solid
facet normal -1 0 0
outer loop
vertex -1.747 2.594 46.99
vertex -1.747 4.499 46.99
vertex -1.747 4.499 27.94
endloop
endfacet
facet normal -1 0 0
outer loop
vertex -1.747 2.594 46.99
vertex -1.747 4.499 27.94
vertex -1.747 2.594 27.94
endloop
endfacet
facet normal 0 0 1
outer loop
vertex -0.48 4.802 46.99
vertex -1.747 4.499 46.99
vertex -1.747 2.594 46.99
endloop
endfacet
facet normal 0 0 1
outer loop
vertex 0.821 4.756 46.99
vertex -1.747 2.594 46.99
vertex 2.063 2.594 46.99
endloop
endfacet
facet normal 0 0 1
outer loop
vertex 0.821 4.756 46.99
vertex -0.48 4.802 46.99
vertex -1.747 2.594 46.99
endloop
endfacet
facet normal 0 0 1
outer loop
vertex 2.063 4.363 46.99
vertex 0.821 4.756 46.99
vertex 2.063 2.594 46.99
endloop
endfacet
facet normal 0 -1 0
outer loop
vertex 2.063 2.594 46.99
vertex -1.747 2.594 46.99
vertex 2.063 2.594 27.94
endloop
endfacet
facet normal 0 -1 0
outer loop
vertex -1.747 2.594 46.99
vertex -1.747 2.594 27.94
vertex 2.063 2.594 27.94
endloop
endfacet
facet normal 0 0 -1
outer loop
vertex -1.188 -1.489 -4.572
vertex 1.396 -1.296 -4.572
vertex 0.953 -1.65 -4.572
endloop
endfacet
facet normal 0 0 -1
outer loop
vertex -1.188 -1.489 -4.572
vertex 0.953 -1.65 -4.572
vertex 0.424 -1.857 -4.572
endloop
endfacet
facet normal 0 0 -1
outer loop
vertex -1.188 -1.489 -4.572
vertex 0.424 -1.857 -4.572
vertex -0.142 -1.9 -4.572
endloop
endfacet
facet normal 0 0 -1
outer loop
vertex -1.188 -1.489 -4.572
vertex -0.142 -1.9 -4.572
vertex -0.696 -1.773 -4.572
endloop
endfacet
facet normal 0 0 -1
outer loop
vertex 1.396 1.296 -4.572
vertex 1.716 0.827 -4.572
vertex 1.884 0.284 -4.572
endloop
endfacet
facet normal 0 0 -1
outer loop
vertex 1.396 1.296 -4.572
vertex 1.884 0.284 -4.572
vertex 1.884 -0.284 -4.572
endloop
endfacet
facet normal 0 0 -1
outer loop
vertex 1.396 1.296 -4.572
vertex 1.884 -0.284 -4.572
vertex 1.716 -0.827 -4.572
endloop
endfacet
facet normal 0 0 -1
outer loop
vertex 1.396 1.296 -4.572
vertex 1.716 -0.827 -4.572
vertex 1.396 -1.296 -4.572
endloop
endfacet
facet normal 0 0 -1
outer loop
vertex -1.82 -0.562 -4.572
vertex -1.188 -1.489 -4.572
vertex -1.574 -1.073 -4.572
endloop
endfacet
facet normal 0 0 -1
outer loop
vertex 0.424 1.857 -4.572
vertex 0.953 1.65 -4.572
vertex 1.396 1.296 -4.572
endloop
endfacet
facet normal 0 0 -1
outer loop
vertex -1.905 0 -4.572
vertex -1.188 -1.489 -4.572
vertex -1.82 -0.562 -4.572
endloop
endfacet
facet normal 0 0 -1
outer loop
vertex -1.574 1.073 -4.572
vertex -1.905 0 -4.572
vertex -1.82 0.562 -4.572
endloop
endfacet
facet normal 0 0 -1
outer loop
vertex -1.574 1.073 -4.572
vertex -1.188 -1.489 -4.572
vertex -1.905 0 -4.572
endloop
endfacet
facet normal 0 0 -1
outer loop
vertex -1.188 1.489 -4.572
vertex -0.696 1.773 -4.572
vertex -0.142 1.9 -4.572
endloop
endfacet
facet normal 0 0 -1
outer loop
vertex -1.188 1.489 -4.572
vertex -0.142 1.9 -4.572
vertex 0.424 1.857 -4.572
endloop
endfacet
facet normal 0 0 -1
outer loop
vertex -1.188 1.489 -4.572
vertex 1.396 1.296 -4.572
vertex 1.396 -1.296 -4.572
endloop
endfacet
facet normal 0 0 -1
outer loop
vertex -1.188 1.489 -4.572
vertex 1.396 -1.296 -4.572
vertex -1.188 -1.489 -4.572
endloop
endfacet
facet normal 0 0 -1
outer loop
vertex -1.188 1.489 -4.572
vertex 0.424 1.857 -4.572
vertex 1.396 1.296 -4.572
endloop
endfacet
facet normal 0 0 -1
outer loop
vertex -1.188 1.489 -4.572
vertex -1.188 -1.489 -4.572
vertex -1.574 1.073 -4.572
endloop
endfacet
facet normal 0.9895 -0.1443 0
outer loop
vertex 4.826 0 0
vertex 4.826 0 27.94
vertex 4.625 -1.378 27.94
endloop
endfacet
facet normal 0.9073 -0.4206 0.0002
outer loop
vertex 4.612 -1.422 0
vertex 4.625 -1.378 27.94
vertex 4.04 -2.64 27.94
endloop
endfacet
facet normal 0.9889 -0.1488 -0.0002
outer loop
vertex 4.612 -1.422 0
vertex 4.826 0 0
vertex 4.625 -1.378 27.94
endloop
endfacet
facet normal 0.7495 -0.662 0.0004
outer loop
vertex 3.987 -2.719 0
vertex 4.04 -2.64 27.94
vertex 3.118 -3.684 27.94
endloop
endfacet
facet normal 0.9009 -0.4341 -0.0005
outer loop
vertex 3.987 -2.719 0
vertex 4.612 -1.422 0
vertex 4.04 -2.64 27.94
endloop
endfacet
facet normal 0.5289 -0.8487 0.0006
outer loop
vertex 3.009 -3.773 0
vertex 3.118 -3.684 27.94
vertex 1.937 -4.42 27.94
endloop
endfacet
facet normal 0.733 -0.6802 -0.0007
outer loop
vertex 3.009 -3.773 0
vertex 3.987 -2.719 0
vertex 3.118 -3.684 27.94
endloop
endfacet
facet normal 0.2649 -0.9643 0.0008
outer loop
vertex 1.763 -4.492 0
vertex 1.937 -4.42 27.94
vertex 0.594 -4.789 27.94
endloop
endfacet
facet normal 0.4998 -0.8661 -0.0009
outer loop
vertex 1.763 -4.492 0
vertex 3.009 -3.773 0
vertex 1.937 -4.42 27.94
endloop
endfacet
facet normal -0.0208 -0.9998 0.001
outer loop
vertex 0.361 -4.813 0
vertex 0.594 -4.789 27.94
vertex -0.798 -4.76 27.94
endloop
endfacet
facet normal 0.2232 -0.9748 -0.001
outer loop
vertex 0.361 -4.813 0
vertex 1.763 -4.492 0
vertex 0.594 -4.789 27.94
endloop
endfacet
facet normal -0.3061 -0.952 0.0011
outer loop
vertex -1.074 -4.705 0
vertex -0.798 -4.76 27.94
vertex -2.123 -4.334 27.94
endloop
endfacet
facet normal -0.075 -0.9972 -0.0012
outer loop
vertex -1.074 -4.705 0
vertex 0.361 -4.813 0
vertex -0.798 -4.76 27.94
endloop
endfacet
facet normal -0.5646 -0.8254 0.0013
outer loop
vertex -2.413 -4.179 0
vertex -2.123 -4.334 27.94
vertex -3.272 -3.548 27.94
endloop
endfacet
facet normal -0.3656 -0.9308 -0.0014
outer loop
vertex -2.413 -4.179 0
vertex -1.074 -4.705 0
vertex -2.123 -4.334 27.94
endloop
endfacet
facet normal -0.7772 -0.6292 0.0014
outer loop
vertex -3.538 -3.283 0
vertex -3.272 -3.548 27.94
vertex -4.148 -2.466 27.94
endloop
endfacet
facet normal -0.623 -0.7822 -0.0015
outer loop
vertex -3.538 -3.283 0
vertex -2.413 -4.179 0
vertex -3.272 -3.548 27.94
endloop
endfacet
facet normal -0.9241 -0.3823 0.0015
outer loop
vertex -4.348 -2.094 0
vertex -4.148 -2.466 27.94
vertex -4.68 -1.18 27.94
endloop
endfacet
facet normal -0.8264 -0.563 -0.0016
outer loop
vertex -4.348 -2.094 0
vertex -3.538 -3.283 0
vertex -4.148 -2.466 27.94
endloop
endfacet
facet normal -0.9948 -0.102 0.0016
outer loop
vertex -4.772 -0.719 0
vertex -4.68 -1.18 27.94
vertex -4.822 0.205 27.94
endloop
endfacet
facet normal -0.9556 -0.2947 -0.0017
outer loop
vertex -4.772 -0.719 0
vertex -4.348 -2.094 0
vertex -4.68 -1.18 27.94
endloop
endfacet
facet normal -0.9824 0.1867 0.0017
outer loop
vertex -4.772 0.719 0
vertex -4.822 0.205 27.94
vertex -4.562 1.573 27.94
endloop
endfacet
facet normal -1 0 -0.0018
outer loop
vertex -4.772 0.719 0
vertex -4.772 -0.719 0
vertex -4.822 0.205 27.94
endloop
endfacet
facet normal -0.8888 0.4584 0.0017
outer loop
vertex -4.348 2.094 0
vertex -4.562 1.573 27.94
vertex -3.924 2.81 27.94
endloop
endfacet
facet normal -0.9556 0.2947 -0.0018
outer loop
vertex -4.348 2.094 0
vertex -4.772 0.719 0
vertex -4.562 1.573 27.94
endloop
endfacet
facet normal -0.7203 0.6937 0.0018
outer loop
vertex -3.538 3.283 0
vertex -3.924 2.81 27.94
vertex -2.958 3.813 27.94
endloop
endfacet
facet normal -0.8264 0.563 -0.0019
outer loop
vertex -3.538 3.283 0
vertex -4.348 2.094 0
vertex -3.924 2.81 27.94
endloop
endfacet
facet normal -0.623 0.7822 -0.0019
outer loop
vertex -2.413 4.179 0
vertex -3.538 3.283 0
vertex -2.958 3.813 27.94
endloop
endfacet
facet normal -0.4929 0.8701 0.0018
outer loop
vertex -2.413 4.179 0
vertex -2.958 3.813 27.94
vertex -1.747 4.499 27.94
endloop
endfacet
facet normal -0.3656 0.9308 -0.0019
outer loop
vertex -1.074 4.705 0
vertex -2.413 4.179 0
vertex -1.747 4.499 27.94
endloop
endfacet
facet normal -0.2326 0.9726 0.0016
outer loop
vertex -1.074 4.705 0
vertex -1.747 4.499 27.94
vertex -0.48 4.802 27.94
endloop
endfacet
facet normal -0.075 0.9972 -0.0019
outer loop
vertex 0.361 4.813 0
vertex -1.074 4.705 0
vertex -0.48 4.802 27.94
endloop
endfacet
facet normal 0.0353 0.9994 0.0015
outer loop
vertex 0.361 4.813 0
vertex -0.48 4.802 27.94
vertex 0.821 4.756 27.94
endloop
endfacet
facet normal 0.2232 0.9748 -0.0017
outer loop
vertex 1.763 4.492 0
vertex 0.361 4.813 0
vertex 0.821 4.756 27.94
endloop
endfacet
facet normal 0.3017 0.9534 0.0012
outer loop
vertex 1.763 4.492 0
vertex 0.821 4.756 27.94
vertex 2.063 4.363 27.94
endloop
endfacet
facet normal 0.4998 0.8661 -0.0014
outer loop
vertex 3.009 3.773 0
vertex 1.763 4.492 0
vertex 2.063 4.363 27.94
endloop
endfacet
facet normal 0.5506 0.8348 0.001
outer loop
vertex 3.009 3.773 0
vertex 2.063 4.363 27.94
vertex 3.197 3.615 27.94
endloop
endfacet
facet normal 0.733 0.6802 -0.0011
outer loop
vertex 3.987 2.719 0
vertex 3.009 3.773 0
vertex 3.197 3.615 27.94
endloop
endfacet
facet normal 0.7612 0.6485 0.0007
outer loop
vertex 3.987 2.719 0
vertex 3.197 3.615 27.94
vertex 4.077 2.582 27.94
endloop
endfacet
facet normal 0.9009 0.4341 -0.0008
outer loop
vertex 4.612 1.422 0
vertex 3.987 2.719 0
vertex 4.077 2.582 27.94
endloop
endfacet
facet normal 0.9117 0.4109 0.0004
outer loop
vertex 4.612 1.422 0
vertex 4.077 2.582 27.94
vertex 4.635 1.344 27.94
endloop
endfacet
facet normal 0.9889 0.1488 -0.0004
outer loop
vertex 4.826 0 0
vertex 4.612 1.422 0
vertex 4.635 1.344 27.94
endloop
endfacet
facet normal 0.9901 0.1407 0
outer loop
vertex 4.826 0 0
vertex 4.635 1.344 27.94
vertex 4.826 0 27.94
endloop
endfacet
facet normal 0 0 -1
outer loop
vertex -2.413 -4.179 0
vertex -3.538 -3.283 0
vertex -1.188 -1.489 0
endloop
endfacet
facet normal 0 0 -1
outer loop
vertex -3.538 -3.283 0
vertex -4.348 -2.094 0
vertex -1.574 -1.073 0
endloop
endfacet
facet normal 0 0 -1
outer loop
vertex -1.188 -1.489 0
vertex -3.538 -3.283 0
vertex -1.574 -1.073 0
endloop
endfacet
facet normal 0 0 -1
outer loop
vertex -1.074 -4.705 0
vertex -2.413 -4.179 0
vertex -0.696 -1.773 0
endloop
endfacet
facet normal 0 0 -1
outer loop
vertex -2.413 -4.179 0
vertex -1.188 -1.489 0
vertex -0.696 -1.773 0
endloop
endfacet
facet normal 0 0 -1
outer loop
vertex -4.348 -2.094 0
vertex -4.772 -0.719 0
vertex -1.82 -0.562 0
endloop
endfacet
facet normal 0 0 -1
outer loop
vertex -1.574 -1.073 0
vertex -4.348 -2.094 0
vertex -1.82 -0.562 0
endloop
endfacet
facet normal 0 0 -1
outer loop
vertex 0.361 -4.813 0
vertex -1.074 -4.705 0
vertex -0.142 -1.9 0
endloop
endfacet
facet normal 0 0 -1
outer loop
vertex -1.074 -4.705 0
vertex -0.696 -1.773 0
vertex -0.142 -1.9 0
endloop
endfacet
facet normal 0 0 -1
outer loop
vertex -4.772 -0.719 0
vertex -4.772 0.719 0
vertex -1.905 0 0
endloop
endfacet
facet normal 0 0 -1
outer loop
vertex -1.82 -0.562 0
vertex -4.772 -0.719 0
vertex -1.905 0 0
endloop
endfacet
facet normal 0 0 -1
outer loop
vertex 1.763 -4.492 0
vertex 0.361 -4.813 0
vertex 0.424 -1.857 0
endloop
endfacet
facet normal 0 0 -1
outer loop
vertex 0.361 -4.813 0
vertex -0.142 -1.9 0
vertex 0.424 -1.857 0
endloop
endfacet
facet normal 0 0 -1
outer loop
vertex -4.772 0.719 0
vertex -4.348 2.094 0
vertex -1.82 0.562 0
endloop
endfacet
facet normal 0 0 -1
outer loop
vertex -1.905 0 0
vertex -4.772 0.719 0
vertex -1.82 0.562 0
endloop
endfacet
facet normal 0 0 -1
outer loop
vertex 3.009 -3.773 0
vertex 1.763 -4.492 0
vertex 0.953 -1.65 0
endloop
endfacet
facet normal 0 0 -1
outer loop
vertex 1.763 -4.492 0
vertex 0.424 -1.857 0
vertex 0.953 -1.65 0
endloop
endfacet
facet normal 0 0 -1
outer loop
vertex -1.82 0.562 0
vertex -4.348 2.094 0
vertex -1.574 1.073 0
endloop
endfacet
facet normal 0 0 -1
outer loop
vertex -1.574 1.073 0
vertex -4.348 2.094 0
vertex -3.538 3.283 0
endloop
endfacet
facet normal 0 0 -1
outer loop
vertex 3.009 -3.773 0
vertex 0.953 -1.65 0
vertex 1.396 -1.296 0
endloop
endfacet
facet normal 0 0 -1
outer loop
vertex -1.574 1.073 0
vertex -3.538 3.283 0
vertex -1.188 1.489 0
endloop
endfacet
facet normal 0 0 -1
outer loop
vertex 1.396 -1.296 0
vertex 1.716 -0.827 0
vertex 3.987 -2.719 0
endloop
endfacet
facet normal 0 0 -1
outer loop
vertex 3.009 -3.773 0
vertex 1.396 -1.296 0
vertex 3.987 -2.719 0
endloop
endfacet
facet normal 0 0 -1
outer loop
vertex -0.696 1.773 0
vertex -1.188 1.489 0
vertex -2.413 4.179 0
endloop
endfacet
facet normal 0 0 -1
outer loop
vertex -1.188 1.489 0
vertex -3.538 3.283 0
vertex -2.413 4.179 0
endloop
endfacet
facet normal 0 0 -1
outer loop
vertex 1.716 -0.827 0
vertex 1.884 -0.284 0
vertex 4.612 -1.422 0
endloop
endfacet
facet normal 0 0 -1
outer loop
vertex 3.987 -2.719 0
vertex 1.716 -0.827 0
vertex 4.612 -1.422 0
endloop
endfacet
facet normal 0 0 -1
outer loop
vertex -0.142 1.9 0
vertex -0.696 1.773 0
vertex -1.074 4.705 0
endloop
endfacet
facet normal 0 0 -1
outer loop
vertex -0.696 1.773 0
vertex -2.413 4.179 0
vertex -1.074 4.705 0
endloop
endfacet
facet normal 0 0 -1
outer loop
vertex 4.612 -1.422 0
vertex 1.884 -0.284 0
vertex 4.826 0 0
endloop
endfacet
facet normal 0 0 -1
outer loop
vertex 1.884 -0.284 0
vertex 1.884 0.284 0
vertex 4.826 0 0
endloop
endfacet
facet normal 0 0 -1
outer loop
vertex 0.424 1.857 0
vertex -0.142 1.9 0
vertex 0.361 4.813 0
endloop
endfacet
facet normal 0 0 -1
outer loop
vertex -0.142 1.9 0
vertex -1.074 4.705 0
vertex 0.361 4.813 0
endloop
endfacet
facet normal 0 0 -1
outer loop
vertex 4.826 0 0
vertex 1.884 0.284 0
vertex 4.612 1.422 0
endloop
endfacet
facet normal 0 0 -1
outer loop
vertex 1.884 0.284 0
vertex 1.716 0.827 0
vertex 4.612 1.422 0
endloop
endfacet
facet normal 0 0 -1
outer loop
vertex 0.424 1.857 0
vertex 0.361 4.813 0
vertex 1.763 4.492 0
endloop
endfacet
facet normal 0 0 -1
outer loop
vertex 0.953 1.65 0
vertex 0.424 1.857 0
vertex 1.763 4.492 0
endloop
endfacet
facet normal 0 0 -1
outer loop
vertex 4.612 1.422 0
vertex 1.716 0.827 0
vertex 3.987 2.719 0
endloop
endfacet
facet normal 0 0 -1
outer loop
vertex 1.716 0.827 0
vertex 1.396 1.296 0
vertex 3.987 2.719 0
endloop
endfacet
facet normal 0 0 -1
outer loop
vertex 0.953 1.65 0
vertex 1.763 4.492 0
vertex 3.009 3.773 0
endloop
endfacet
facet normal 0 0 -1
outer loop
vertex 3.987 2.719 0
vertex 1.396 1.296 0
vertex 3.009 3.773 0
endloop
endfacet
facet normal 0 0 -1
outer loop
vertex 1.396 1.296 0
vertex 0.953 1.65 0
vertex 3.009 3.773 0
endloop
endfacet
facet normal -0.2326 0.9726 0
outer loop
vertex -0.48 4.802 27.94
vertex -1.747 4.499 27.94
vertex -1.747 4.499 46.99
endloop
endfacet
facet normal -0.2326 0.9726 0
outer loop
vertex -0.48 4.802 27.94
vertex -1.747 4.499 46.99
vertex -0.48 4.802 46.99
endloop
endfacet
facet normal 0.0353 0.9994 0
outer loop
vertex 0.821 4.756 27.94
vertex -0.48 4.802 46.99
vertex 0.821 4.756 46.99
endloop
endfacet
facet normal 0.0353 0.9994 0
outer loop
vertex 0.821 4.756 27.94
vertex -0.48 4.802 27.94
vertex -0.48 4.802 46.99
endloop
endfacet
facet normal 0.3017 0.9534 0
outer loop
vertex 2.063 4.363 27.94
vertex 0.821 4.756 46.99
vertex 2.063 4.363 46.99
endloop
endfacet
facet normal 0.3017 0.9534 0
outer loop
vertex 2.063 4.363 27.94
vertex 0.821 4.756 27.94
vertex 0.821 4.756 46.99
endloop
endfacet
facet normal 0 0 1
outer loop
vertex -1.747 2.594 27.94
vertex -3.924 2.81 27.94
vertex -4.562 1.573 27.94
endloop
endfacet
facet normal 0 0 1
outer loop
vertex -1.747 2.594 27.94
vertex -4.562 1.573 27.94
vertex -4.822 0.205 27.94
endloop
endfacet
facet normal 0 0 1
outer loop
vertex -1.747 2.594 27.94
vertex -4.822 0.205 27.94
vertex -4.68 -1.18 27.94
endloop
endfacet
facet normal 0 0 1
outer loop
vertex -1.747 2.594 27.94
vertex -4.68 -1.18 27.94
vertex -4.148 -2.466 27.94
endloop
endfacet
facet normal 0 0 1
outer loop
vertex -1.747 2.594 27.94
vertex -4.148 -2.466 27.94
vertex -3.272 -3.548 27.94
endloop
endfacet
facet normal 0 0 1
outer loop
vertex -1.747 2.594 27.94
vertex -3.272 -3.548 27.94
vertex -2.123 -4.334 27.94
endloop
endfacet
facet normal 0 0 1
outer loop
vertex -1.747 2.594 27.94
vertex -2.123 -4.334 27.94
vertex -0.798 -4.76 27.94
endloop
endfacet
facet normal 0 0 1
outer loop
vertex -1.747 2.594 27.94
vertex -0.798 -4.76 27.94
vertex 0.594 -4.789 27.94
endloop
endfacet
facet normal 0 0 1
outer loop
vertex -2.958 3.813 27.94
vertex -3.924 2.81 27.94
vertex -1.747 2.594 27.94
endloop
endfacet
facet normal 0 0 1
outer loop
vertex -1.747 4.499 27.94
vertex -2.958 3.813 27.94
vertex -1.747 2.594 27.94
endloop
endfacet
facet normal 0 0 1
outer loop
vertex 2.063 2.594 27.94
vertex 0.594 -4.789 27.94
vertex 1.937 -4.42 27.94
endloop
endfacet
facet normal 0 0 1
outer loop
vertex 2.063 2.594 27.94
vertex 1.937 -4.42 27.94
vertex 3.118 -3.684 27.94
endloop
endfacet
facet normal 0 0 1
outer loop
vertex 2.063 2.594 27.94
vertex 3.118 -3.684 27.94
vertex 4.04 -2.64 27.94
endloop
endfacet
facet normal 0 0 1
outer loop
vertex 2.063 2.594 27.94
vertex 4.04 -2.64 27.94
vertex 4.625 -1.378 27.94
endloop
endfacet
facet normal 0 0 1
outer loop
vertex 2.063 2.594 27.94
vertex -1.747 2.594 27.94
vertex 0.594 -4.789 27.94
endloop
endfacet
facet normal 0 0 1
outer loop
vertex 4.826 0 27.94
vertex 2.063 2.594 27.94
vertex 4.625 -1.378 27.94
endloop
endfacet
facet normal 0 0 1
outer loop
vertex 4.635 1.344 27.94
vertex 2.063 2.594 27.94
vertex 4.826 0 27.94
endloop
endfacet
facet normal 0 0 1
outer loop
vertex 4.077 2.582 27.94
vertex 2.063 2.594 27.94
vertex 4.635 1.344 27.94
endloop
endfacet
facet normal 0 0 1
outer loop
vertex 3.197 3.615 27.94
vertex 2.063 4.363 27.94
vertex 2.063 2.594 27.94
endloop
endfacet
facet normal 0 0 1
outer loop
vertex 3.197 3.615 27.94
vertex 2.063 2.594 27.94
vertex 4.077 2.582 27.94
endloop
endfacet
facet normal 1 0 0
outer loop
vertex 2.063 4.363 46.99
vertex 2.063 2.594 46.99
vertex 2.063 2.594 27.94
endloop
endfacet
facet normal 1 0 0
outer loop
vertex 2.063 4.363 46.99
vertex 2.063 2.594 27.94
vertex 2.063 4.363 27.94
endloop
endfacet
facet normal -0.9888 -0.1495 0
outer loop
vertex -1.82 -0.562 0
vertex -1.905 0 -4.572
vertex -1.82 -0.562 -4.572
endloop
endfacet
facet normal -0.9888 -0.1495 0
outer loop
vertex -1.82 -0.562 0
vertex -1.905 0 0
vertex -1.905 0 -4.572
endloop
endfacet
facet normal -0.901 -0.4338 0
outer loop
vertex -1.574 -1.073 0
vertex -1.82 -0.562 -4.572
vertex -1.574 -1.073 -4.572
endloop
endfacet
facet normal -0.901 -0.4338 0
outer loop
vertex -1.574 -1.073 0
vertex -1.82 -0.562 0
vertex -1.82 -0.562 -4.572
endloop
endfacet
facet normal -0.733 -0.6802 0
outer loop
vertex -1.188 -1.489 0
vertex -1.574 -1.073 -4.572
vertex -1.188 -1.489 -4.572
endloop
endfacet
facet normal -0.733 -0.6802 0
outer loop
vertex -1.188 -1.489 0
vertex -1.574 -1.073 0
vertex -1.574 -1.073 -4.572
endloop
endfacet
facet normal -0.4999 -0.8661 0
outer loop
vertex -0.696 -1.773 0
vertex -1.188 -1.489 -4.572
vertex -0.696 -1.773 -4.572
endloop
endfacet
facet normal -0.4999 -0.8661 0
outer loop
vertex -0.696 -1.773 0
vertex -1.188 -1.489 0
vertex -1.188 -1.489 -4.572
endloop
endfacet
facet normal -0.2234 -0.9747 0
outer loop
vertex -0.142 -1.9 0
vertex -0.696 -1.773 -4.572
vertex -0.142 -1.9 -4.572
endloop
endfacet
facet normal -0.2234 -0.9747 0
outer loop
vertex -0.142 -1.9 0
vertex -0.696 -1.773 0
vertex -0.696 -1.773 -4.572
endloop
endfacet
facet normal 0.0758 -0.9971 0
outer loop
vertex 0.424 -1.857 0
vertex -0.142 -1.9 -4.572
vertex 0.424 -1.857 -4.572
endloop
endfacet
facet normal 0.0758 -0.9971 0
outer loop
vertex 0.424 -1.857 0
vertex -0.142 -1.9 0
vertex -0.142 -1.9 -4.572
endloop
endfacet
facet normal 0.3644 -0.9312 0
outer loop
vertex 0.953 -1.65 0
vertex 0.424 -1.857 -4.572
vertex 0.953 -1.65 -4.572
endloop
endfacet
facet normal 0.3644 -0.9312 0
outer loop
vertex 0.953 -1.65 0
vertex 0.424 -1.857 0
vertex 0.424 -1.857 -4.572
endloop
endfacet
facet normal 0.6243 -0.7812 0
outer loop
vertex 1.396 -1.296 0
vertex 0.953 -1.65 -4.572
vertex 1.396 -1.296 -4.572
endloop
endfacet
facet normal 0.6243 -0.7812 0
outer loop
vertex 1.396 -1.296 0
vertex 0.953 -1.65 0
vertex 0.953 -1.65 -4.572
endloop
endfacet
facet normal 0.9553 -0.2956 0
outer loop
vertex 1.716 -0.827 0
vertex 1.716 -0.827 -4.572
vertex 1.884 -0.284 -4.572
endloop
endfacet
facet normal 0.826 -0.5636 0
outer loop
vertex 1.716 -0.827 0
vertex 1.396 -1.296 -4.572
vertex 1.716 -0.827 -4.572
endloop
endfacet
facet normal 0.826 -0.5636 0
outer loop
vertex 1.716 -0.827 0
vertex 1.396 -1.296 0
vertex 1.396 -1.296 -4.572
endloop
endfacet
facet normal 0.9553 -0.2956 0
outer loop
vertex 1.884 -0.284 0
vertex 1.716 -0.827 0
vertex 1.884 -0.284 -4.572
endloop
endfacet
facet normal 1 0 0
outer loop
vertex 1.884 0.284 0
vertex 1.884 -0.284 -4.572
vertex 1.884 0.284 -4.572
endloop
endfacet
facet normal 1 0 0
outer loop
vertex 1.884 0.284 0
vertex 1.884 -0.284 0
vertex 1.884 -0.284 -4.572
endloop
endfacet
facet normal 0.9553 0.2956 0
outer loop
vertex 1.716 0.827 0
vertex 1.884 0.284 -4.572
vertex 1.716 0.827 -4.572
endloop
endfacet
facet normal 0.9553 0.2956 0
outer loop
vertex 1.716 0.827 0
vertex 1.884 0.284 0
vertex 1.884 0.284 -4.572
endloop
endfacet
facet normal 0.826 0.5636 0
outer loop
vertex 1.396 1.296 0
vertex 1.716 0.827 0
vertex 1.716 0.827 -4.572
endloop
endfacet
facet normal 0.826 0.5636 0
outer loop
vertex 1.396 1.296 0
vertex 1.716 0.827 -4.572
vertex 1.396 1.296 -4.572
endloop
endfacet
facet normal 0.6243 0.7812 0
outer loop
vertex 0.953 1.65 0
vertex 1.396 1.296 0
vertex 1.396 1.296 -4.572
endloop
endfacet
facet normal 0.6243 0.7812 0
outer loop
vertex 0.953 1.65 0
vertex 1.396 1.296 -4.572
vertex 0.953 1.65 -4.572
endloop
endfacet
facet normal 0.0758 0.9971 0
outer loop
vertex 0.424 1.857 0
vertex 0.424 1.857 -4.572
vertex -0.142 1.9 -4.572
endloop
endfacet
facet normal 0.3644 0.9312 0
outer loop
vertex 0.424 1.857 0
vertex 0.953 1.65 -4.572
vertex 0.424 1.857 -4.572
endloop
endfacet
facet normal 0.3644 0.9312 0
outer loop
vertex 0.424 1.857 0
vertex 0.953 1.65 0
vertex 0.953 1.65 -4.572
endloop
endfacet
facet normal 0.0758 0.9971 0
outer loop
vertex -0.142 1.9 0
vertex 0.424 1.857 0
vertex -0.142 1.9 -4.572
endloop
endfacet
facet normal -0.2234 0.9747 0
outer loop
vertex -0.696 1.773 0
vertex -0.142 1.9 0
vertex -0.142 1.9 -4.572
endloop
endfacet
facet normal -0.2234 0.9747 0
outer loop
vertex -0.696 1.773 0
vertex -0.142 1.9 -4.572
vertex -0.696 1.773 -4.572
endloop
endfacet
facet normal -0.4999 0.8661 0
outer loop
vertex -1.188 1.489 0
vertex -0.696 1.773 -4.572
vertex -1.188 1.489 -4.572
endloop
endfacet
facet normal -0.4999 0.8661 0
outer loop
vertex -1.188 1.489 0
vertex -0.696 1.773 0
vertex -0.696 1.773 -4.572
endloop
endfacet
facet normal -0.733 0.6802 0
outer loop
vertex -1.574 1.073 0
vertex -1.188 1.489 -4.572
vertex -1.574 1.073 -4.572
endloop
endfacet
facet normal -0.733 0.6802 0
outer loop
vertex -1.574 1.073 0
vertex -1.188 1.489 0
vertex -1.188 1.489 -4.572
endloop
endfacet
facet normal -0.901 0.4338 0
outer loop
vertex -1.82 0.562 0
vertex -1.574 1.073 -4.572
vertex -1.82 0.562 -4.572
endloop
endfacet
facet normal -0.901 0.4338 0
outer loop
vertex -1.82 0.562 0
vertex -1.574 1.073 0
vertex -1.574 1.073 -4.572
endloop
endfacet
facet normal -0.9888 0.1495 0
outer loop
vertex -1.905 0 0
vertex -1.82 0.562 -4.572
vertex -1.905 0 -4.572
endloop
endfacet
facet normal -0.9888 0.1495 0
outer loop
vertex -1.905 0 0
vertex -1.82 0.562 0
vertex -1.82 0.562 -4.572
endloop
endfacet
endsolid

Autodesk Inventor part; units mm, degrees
ref_plane "YZ Plane" through (0, 0, 0) normal (1, 0, 0) x (0, 1, 0)
ref_plane "XZ Plane" through (0, 0, 0) normal (0, 1, 0) x (-1, 0, 0)
ref_plane "XY Plane" through (0, 0, 0) normal (0, 0, 1) x (1, 0, 0)
sketch "Sketch1" plane through (0, 0, 0) normal (0, 0, 1) x (1, 0, 0)
  circle A0 centre (0, 0) radius 4.826
  dimension "d7" = 9.652
extrude "Extrusion1" add sketch "Sketch1" along normal blind 27.94
sketch "Sketch2" plane through (0, 0, 27.94) normal (0, 0, 1) x (1, 0, 0)
  arc A0 (2.0632, 4.3627) -> (-1.7468, 4.4988) centre (0, 0) ccw
  circle A1 centre (0, 0) radius 4.826 projected
  line L0 (-1.7468, 4.4988) -> (-1.7468, 2.5938)
  line L1 (-1.7468, 2.5938) -> (2.0632, 2.5938)
  line L2 (2.0632, 2.5938) -> (2.0632, 4.3627)
  dimension "d8" = 3.81
  dimension "d9" = 1.905
extrude "Extrusion2" add sketch "Sketch2" along normal blind 19.05 contours L2 L1 L0 A0
sketch "Sketch3" plane through (0, 0, 0) normal (0, 0, -1) x (-1, 0, 0)
  circle A0 centre (0, 0) radius 1.905
  dimension "d6" = 3.81
extrude "Extrusion3" add sketch "Sketch3" along normal blind 4.572
properties part number "emcoder_coupler"
